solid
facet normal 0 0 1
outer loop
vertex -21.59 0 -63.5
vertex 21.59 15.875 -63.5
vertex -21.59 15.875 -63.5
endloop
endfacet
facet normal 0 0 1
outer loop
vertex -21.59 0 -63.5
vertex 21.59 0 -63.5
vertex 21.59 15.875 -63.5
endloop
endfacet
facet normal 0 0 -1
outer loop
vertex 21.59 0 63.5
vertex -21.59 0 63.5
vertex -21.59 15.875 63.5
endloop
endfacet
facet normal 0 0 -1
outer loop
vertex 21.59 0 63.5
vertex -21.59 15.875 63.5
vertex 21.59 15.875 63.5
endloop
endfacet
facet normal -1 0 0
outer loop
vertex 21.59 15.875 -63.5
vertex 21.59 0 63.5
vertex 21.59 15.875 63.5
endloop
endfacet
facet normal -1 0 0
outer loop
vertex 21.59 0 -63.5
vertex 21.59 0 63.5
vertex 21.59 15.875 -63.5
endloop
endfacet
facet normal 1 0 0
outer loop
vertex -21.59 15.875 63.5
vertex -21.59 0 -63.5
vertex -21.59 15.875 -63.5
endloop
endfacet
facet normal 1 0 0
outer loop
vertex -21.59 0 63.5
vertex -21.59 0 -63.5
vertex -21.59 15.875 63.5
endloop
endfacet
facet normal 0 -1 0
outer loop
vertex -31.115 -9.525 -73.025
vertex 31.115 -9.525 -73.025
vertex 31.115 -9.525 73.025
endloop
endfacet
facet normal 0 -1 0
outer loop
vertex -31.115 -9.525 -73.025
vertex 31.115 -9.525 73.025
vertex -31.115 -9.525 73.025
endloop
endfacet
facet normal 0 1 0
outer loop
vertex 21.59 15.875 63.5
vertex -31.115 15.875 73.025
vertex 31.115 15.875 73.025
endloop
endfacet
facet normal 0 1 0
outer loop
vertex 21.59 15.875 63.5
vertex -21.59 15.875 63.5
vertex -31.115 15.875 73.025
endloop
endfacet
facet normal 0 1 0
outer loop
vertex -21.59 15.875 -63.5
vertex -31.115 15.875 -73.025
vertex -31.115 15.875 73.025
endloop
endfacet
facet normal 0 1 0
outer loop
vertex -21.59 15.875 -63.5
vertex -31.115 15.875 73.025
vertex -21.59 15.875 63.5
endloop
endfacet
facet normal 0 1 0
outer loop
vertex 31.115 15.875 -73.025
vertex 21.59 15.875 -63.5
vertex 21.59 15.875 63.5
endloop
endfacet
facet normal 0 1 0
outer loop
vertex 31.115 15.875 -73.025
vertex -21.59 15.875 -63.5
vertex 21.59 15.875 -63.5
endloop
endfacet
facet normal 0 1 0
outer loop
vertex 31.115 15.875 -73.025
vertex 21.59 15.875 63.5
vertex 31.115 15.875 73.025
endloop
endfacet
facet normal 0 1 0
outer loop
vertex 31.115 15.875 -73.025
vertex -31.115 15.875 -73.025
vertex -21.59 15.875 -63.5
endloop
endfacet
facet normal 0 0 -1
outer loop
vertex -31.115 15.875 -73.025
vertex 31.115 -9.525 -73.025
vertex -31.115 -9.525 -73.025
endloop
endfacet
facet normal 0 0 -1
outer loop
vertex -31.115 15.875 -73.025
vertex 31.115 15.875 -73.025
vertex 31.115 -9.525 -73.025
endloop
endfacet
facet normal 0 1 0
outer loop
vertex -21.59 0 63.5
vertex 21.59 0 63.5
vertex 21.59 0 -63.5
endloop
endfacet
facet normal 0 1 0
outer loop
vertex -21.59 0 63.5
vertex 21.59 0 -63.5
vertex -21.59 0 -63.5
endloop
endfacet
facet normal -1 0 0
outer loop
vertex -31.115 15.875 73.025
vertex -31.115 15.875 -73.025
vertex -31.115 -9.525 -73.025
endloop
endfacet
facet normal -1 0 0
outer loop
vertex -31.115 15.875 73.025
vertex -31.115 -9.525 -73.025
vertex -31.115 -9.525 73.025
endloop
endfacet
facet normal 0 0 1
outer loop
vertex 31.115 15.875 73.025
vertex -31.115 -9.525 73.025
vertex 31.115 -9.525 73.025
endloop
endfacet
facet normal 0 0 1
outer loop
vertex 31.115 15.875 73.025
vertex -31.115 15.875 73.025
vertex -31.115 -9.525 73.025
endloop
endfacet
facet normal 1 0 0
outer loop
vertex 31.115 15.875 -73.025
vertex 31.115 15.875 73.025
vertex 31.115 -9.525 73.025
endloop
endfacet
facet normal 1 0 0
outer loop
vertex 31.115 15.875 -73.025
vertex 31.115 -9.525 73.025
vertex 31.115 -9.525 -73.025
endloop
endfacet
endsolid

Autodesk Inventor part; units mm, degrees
ref_plane "XZ Plane" through (0, 0, 0) normal (0, 1, 0) x (-1, 0, 0)
ref_plane "XY Plane" through (0, 0, 0) normal (0, 0, 1) x (1, 0, 0)
sketch "Sketch1" plane through (0, 0, 0) normal (0, 1, 0) x (-1, 0, 0)
  line L0 (31.115, 73.025) -> (-31.115, 73.025)
  line L1 (-31.115, 73.025) -> (-31.115, -73.025)
  line L2 (-31.115, -73.025) -> (31.115, -73.025)
  line L3 (31.115, -73.025) -> (31.115, 73.025)
  line L4 (31.115, 73.025) -> (-31.115, -73.025) construction
  line L5 (-31.115, 73.025) -> (31.115, -73.025) construction
  point P0 (0, 0)
  dimension "outerWidth" = 62.23
  dimension "outerLength" = 146.05
extrude "Extrusion1" add sketch "Sketch1" against normal blind 9.525
sketch "Sketch2" plane through (0, 0, 0) normal (0, 1, 0) x (1, 0, 0)
  line L0 (31.115, -73.025) -> (31.115, 73.025)
  line L1 (31.115, 73.025) -> (-31.115, 73.025)
  line L2 (-31.115, 73.025) -> (-31.115, -73.025)
  line L3 (-31.115, -73.025) -> (31.115, -73.025)
  line L4 (31.115, -73.025) -> (-31.115, 73.025) construction
  line L5 (31.115, 73.025) -> (-31.115, -73.025) construction
  line L6 (21.59, -63.5) -> (21.59, 63.5)
  line L7 (21.59, 63.5) -> (-21.59, 63.5)
  line L8 (-21.59, 63.5) -> (-21.59, -63.5)
  line L9 (-21.59, -63.5) -> (21.59, -63.5)
  line L10 (21.59, -63.5) -> (-21.59, 63.5) construction
  line L11 (21.59, 63.5) -> (-21.59, -63.5) construction
  line L12 (31.115, 73.025) -> (-31.115, 73.025) projected
  line L13 (-31.115, 73.025) -> (-31.115, -73.025) projected
  point P0 (0, 0)
  dimension "d1" = 9.525
  dimension "d5" = 9.525
extrude "Extrusion2" add sketch "Sketch2" along normal blind 15.875
equation "\"outerWidth\" = innerWidth + 2 * wallThickness"
equation "\"outerLength\" = innerLength + 2 * wallThickness"
equation "\"d2\" = wallThickness"
equation "\"d1\" = wallThickness"
equation "\"d5\" = wallThickness"
equation "\"d4\" = outerHeight - wallThickness"
equation "\"innerLength\" = 127"
equation "\"width\" = 196.85"
equation "\"outerHeight\" = 25.4"
equation "\"wallThickness\" = 9.525"
equation "\"innerWidth\" = 43.18"
properties part number "connectorToTubeBrackets" material "PC/ABS Plastic"
